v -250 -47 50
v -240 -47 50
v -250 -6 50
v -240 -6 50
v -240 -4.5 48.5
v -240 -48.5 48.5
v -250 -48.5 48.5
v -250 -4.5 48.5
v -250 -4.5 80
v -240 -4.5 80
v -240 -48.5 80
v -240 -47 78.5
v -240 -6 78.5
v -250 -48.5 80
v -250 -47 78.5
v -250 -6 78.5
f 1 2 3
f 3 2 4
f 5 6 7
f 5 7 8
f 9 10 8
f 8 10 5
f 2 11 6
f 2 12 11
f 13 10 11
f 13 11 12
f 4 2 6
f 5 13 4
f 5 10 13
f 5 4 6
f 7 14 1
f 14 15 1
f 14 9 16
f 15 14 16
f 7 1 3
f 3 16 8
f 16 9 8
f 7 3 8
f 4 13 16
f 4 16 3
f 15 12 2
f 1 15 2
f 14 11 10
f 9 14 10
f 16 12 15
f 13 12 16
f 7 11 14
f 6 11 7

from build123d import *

# Parameters (mm, degrees)
MAIN_PROFILE_SKETCH_W   = 31.5
MAIN_PROFILE_SKETCH_H   = 44
MAIN_PROFILE_SKETCH_W_2 = 28.5
MAIN_PROFILE_SKETCH_H_2 = 41
MAIN_EXTRUSION_DEPTH    = 10


with BuildPart() as part:
    # Main Profile Sketch → Main Extrusion (new body)
    with BuildSketch(Plane(origin=(-240, 0, 0), x_dir=(0, 0, -1), z_dir=(1, 0, 0))):
        with Locations((-64.25, -26.5)):
            Rectangle(MAIN_PROFILE_SKETCH_W, MAIN_PROFILE_SKETCH_H)
        with Locations((-64.25, -26.5)):
            Rectangle(MAIN_PROFILE_SKETCH_W_2, MAIN_PROFILE_SKETCH_H_2, mode=Mode.SUBTRACT)
    extrude(amount=-MAIN_EXTRUSION_DEPTH)


solid = part.part
